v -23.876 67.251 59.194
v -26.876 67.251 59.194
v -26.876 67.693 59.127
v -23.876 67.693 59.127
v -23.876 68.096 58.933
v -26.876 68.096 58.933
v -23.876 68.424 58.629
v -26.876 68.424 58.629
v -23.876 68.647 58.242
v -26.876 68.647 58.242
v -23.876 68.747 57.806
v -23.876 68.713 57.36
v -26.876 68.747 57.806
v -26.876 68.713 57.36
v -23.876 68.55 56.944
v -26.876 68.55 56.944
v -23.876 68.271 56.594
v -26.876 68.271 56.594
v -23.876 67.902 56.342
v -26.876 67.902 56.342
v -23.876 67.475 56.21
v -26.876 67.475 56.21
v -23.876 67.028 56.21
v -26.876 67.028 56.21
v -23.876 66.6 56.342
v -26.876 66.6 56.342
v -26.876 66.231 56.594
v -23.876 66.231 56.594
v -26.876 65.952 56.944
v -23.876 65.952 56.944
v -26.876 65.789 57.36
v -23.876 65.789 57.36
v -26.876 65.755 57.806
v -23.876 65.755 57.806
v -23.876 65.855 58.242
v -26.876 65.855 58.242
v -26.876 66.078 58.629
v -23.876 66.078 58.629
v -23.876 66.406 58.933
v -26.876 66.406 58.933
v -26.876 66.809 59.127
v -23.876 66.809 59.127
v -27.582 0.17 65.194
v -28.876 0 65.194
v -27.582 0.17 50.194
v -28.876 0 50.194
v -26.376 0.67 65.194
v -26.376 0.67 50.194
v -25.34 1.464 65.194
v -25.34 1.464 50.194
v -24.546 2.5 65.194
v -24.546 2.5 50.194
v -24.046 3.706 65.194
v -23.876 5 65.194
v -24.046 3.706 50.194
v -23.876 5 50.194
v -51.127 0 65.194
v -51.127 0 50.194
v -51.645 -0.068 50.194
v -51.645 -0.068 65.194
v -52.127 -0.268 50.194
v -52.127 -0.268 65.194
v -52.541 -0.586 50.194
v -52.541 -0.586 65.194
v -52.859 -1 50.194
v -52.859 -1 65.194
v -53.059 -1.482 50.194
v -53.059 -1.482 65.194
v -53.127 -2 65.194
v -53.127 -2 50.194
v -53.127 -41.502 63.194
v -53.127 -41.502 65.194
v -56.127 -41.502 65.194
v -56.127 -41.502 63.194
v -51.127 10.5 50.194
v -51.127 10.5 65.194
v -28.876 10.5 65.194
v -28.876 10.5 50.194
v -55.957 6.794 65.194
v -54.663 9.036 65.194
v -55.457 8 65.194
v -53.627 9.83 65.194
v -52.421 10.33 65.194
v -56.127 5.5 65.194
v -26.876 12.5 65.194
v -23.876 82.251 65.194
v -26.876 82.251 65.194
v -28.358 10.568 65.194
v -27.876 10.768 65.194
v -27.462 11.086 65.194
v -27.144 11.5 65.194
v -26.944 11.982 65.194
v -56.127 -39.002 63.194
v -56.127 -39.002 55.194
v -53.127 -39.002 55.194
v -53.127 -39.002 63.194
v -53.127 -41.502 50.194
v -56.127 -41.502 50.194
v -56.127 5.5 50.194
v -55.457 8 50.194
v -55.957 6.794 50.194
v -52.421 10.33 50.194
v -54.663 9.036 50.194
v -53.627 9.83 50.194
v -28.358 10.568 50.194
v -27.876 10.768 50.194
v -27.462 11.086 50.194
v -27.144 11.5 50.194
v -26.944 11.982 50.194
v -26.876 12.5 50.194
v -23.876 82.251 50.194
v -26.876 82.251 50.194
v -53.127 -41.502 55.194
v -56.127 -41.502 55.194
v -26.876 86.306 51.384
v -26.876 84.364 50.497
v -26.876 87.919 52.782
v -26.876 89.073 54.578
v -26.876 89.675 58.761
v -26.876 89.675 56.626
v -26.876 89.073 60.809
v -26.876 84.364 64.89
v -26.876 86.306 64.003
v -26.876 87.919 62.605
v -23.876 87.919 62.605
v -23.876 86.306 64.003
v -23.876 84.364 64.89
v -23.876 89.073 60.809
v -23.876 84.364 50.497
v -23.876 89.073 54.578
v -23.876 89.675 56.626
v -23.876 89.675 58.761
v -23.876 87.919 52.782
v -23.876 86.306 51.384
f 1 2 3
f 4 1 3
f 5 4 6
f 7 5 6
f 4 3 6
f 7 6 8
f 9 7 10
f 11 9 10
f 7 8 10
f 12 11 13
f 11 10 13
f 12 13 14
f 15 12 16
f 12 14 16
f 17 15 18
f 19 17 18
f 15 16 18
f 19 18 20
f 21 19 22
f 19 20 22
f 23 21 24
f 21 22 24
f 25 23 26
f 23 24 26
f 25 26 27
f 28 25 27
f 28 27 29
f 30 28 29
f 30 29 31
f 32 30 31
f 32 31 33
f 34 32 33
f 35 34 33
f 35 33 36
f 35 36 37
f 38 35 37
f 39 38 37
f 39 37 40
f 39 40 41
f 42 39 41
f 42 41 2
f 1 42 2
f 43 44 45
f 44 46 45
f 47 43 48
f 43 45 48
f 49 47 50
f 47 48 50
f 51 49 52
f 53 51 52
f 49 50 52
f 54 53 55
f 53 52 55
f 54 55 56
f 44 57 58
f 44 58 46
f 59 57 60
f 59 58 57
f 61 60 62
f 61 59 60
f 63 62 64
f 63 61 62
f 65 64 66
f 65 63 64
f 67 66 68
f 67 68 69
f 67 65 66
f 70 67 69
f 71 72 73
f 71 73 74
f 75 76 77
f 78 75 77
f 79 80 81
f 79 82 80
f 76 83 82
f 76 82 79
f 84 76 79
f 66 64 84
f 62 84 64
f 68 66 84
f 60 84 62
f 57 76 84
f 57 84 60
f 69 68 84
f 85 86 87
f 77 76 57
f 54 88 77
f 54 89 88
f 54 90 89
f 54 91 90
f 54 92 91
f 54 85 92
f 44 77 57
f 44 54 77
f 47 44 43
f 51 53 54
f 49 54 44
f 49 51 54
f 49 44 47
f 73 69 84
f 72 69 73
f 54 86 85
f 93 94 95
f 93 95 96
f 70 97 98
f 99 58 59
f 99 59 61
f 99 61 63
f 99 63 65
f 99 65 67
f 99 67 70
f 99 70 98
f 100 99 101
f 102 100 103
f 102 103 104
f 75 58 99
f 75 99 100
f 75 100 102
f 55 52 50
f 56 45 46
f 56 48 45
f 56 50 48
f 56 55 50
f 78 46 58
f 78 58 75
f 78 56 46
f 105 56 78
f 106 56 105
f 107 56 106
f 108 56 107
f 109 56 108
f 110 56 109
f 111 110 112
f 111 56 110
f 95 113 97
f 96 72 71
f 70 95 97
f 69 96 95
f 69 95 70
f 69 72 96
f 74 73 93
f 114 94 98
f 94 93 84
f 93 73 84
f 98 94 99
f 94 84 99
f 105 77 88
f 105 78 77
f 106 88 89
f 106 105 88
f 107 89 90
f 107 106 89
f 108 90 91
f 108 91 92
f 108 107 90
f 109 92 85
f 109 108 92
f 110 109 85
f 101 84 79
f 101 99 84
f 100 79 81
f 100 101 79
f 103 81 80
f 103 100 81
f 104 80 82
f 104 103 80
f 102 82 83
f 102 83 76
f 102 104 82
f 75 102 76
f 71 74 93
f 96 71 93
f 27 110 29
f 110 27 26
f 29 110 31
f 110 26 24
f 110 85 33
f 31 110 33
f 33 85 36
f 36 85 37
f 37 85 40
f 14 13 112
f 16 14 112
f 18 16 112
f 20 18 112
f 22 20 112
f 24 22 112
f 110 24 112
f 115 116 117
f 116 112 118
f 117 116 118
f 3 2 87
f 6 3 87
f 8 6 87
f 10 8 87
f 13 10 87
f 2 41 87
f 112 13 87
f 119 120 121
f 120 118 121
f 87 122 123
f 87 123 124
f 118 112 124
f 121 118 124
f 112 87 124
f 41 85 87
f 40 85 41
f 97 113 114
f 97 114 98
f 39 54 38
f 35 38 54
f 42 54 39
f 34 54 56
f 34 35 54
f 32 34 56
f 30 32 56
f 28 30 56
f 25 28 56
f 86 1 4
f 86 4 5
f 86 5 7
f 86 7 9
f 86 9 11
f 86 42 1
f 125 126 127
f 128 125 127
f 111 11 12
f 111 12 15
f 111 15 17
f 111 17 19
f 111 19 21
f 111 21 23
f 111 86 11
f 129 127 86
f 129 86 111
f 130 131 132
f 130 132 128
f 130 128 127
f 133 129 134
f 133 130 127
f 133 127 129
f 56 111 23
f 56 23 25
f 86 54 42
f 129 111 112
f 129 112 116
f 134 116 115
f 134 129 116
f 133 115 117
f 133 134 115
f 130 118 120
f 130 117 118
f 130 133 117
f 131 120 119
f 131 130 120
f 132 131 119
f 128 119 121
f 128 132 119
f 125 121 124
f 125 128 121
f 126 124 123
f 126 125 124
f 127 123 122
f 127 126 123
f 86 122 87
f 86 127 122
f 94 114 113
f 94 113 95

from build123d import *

# Parameters (mm, degrees)
BOSS_EXTRUDE1_DEPTH          = 32.251106428
SKETCH2_W                    = 29.251106428
SKETCH2_H                    = 41.502212856
CUT_EXTRUDE1_DEPTH           = 107.913538909
SKETCH3_W                    = 29.251106428
SKETCH3_H                    = 79.251106428
CUT_EXTRUDE2_DEPTH           = 107.913538909
SKETCH4_W                    = 8
SKETCH4_H                    = 2.5
CUT_EXTRUDE3_DEPTH           = 116.523199892
F_3_0_3_DIAMETER_HOLE1_D     = 3
F_3_0_3_DIAMETER_HOLE1_DEPTH = 32.251106428
FILLET1_R                    = 2
FILLET2_R                    = 5


with BuildPart() as part:
    # Sketch1 → Boss-Extrude1 (new body)
    with BuildSketch(Plane(origin=(-23.875925357, 0, 0), x_dir=(0, 0, -1), z_dir=(1, 0, 0))):
        with BuildLine():
            Line((-65.19367103, 82.251106428), (-65.19367103, -41.502212856))
            Line((-65.19367103, -41.502212856), (-50.19367103, -41.502212856))
            Line((-50.19367103, -41.502212856), (-50.19367103, 82.251106428))
            ThreePointArc((-50.19367103, 82.251106428), (-57.69367103, 89.751106428), (-65.19367103, 82.251106428))
        make_face()
    extrude(amount=-BOSS_EXTRUDE1_DEPTH)

    # Sketch2 → Cut-Extrude1 (cut, through all)
    with BuildSketch(Plane.XY.offset(65.19367103)):
        with Locations((-38.501478571, -20.751106428)):
            Rectangle(SKETCH2_W, SKETCH2_H)
    extrude(amount=-CUT_EXTRUDE1_DEPTH, mode=Mode.SUBTRACT)

    # Sketch3 → Cut-Extrude2 (cut, through all)
    with BuildSketch(Plane.XY.offset(65.19367103)):
        with Locations((-41.501478571, 50.125553214)):
            Rectangle(SKETCH3_W, SKETCH3_H)
    extrude(amount=-CUT_EXTRUDE2_DEPTH, mode=Mode.SUBTRACT)

    # Sketch4 → Cut-Extrude3 (cut, through all)
    with BuildSketch(Plane.ZY.offset(56.127031785)):
        with Locations((59.19367103, -40.252212856)):
            Rectangle(SKETCH4_W, SKETCH4_H)
    extrude(amount=-CUT_EXTRUDE3_DEPTH, mode=Mode.SUBTRACT)

    # Ø3.0 (3) Diameter Hole1
    with Locations(Plane(origin=(-23.875925357, 0, 0), x_dir=(0, 0, -1), z_dir=(1, 0, 0))):
        with Locations((-57.69367103, 67.251106428)):
            Hole(F_3_0_3_DIAMETER_HOLE1_D / 2, depth=F_3_0_3_DIAMETER_HOLE1_DEPTH)

    # Fillet1
    fillet1_edges = [part.edges().sort_by_distance(p)[0] for p in [
        (-53.127031785, 0, 57.69367103),
        (-26.875925357, 10.5, 57.69367103),
    ]]
    fillet(fillet1_edges, radius=FILLET1_R)

    # Fillet2
    fillet2_edges = [part.edges().sort_by_distance(p)[0] for p in [
        (-23.875925357, 0, 57.69367103),
        (-56.127031785, 10.5, 57.69367103),
    ]]
    fillet(fillet2_edges, radius=FILLET2_R)


solid = part.part
